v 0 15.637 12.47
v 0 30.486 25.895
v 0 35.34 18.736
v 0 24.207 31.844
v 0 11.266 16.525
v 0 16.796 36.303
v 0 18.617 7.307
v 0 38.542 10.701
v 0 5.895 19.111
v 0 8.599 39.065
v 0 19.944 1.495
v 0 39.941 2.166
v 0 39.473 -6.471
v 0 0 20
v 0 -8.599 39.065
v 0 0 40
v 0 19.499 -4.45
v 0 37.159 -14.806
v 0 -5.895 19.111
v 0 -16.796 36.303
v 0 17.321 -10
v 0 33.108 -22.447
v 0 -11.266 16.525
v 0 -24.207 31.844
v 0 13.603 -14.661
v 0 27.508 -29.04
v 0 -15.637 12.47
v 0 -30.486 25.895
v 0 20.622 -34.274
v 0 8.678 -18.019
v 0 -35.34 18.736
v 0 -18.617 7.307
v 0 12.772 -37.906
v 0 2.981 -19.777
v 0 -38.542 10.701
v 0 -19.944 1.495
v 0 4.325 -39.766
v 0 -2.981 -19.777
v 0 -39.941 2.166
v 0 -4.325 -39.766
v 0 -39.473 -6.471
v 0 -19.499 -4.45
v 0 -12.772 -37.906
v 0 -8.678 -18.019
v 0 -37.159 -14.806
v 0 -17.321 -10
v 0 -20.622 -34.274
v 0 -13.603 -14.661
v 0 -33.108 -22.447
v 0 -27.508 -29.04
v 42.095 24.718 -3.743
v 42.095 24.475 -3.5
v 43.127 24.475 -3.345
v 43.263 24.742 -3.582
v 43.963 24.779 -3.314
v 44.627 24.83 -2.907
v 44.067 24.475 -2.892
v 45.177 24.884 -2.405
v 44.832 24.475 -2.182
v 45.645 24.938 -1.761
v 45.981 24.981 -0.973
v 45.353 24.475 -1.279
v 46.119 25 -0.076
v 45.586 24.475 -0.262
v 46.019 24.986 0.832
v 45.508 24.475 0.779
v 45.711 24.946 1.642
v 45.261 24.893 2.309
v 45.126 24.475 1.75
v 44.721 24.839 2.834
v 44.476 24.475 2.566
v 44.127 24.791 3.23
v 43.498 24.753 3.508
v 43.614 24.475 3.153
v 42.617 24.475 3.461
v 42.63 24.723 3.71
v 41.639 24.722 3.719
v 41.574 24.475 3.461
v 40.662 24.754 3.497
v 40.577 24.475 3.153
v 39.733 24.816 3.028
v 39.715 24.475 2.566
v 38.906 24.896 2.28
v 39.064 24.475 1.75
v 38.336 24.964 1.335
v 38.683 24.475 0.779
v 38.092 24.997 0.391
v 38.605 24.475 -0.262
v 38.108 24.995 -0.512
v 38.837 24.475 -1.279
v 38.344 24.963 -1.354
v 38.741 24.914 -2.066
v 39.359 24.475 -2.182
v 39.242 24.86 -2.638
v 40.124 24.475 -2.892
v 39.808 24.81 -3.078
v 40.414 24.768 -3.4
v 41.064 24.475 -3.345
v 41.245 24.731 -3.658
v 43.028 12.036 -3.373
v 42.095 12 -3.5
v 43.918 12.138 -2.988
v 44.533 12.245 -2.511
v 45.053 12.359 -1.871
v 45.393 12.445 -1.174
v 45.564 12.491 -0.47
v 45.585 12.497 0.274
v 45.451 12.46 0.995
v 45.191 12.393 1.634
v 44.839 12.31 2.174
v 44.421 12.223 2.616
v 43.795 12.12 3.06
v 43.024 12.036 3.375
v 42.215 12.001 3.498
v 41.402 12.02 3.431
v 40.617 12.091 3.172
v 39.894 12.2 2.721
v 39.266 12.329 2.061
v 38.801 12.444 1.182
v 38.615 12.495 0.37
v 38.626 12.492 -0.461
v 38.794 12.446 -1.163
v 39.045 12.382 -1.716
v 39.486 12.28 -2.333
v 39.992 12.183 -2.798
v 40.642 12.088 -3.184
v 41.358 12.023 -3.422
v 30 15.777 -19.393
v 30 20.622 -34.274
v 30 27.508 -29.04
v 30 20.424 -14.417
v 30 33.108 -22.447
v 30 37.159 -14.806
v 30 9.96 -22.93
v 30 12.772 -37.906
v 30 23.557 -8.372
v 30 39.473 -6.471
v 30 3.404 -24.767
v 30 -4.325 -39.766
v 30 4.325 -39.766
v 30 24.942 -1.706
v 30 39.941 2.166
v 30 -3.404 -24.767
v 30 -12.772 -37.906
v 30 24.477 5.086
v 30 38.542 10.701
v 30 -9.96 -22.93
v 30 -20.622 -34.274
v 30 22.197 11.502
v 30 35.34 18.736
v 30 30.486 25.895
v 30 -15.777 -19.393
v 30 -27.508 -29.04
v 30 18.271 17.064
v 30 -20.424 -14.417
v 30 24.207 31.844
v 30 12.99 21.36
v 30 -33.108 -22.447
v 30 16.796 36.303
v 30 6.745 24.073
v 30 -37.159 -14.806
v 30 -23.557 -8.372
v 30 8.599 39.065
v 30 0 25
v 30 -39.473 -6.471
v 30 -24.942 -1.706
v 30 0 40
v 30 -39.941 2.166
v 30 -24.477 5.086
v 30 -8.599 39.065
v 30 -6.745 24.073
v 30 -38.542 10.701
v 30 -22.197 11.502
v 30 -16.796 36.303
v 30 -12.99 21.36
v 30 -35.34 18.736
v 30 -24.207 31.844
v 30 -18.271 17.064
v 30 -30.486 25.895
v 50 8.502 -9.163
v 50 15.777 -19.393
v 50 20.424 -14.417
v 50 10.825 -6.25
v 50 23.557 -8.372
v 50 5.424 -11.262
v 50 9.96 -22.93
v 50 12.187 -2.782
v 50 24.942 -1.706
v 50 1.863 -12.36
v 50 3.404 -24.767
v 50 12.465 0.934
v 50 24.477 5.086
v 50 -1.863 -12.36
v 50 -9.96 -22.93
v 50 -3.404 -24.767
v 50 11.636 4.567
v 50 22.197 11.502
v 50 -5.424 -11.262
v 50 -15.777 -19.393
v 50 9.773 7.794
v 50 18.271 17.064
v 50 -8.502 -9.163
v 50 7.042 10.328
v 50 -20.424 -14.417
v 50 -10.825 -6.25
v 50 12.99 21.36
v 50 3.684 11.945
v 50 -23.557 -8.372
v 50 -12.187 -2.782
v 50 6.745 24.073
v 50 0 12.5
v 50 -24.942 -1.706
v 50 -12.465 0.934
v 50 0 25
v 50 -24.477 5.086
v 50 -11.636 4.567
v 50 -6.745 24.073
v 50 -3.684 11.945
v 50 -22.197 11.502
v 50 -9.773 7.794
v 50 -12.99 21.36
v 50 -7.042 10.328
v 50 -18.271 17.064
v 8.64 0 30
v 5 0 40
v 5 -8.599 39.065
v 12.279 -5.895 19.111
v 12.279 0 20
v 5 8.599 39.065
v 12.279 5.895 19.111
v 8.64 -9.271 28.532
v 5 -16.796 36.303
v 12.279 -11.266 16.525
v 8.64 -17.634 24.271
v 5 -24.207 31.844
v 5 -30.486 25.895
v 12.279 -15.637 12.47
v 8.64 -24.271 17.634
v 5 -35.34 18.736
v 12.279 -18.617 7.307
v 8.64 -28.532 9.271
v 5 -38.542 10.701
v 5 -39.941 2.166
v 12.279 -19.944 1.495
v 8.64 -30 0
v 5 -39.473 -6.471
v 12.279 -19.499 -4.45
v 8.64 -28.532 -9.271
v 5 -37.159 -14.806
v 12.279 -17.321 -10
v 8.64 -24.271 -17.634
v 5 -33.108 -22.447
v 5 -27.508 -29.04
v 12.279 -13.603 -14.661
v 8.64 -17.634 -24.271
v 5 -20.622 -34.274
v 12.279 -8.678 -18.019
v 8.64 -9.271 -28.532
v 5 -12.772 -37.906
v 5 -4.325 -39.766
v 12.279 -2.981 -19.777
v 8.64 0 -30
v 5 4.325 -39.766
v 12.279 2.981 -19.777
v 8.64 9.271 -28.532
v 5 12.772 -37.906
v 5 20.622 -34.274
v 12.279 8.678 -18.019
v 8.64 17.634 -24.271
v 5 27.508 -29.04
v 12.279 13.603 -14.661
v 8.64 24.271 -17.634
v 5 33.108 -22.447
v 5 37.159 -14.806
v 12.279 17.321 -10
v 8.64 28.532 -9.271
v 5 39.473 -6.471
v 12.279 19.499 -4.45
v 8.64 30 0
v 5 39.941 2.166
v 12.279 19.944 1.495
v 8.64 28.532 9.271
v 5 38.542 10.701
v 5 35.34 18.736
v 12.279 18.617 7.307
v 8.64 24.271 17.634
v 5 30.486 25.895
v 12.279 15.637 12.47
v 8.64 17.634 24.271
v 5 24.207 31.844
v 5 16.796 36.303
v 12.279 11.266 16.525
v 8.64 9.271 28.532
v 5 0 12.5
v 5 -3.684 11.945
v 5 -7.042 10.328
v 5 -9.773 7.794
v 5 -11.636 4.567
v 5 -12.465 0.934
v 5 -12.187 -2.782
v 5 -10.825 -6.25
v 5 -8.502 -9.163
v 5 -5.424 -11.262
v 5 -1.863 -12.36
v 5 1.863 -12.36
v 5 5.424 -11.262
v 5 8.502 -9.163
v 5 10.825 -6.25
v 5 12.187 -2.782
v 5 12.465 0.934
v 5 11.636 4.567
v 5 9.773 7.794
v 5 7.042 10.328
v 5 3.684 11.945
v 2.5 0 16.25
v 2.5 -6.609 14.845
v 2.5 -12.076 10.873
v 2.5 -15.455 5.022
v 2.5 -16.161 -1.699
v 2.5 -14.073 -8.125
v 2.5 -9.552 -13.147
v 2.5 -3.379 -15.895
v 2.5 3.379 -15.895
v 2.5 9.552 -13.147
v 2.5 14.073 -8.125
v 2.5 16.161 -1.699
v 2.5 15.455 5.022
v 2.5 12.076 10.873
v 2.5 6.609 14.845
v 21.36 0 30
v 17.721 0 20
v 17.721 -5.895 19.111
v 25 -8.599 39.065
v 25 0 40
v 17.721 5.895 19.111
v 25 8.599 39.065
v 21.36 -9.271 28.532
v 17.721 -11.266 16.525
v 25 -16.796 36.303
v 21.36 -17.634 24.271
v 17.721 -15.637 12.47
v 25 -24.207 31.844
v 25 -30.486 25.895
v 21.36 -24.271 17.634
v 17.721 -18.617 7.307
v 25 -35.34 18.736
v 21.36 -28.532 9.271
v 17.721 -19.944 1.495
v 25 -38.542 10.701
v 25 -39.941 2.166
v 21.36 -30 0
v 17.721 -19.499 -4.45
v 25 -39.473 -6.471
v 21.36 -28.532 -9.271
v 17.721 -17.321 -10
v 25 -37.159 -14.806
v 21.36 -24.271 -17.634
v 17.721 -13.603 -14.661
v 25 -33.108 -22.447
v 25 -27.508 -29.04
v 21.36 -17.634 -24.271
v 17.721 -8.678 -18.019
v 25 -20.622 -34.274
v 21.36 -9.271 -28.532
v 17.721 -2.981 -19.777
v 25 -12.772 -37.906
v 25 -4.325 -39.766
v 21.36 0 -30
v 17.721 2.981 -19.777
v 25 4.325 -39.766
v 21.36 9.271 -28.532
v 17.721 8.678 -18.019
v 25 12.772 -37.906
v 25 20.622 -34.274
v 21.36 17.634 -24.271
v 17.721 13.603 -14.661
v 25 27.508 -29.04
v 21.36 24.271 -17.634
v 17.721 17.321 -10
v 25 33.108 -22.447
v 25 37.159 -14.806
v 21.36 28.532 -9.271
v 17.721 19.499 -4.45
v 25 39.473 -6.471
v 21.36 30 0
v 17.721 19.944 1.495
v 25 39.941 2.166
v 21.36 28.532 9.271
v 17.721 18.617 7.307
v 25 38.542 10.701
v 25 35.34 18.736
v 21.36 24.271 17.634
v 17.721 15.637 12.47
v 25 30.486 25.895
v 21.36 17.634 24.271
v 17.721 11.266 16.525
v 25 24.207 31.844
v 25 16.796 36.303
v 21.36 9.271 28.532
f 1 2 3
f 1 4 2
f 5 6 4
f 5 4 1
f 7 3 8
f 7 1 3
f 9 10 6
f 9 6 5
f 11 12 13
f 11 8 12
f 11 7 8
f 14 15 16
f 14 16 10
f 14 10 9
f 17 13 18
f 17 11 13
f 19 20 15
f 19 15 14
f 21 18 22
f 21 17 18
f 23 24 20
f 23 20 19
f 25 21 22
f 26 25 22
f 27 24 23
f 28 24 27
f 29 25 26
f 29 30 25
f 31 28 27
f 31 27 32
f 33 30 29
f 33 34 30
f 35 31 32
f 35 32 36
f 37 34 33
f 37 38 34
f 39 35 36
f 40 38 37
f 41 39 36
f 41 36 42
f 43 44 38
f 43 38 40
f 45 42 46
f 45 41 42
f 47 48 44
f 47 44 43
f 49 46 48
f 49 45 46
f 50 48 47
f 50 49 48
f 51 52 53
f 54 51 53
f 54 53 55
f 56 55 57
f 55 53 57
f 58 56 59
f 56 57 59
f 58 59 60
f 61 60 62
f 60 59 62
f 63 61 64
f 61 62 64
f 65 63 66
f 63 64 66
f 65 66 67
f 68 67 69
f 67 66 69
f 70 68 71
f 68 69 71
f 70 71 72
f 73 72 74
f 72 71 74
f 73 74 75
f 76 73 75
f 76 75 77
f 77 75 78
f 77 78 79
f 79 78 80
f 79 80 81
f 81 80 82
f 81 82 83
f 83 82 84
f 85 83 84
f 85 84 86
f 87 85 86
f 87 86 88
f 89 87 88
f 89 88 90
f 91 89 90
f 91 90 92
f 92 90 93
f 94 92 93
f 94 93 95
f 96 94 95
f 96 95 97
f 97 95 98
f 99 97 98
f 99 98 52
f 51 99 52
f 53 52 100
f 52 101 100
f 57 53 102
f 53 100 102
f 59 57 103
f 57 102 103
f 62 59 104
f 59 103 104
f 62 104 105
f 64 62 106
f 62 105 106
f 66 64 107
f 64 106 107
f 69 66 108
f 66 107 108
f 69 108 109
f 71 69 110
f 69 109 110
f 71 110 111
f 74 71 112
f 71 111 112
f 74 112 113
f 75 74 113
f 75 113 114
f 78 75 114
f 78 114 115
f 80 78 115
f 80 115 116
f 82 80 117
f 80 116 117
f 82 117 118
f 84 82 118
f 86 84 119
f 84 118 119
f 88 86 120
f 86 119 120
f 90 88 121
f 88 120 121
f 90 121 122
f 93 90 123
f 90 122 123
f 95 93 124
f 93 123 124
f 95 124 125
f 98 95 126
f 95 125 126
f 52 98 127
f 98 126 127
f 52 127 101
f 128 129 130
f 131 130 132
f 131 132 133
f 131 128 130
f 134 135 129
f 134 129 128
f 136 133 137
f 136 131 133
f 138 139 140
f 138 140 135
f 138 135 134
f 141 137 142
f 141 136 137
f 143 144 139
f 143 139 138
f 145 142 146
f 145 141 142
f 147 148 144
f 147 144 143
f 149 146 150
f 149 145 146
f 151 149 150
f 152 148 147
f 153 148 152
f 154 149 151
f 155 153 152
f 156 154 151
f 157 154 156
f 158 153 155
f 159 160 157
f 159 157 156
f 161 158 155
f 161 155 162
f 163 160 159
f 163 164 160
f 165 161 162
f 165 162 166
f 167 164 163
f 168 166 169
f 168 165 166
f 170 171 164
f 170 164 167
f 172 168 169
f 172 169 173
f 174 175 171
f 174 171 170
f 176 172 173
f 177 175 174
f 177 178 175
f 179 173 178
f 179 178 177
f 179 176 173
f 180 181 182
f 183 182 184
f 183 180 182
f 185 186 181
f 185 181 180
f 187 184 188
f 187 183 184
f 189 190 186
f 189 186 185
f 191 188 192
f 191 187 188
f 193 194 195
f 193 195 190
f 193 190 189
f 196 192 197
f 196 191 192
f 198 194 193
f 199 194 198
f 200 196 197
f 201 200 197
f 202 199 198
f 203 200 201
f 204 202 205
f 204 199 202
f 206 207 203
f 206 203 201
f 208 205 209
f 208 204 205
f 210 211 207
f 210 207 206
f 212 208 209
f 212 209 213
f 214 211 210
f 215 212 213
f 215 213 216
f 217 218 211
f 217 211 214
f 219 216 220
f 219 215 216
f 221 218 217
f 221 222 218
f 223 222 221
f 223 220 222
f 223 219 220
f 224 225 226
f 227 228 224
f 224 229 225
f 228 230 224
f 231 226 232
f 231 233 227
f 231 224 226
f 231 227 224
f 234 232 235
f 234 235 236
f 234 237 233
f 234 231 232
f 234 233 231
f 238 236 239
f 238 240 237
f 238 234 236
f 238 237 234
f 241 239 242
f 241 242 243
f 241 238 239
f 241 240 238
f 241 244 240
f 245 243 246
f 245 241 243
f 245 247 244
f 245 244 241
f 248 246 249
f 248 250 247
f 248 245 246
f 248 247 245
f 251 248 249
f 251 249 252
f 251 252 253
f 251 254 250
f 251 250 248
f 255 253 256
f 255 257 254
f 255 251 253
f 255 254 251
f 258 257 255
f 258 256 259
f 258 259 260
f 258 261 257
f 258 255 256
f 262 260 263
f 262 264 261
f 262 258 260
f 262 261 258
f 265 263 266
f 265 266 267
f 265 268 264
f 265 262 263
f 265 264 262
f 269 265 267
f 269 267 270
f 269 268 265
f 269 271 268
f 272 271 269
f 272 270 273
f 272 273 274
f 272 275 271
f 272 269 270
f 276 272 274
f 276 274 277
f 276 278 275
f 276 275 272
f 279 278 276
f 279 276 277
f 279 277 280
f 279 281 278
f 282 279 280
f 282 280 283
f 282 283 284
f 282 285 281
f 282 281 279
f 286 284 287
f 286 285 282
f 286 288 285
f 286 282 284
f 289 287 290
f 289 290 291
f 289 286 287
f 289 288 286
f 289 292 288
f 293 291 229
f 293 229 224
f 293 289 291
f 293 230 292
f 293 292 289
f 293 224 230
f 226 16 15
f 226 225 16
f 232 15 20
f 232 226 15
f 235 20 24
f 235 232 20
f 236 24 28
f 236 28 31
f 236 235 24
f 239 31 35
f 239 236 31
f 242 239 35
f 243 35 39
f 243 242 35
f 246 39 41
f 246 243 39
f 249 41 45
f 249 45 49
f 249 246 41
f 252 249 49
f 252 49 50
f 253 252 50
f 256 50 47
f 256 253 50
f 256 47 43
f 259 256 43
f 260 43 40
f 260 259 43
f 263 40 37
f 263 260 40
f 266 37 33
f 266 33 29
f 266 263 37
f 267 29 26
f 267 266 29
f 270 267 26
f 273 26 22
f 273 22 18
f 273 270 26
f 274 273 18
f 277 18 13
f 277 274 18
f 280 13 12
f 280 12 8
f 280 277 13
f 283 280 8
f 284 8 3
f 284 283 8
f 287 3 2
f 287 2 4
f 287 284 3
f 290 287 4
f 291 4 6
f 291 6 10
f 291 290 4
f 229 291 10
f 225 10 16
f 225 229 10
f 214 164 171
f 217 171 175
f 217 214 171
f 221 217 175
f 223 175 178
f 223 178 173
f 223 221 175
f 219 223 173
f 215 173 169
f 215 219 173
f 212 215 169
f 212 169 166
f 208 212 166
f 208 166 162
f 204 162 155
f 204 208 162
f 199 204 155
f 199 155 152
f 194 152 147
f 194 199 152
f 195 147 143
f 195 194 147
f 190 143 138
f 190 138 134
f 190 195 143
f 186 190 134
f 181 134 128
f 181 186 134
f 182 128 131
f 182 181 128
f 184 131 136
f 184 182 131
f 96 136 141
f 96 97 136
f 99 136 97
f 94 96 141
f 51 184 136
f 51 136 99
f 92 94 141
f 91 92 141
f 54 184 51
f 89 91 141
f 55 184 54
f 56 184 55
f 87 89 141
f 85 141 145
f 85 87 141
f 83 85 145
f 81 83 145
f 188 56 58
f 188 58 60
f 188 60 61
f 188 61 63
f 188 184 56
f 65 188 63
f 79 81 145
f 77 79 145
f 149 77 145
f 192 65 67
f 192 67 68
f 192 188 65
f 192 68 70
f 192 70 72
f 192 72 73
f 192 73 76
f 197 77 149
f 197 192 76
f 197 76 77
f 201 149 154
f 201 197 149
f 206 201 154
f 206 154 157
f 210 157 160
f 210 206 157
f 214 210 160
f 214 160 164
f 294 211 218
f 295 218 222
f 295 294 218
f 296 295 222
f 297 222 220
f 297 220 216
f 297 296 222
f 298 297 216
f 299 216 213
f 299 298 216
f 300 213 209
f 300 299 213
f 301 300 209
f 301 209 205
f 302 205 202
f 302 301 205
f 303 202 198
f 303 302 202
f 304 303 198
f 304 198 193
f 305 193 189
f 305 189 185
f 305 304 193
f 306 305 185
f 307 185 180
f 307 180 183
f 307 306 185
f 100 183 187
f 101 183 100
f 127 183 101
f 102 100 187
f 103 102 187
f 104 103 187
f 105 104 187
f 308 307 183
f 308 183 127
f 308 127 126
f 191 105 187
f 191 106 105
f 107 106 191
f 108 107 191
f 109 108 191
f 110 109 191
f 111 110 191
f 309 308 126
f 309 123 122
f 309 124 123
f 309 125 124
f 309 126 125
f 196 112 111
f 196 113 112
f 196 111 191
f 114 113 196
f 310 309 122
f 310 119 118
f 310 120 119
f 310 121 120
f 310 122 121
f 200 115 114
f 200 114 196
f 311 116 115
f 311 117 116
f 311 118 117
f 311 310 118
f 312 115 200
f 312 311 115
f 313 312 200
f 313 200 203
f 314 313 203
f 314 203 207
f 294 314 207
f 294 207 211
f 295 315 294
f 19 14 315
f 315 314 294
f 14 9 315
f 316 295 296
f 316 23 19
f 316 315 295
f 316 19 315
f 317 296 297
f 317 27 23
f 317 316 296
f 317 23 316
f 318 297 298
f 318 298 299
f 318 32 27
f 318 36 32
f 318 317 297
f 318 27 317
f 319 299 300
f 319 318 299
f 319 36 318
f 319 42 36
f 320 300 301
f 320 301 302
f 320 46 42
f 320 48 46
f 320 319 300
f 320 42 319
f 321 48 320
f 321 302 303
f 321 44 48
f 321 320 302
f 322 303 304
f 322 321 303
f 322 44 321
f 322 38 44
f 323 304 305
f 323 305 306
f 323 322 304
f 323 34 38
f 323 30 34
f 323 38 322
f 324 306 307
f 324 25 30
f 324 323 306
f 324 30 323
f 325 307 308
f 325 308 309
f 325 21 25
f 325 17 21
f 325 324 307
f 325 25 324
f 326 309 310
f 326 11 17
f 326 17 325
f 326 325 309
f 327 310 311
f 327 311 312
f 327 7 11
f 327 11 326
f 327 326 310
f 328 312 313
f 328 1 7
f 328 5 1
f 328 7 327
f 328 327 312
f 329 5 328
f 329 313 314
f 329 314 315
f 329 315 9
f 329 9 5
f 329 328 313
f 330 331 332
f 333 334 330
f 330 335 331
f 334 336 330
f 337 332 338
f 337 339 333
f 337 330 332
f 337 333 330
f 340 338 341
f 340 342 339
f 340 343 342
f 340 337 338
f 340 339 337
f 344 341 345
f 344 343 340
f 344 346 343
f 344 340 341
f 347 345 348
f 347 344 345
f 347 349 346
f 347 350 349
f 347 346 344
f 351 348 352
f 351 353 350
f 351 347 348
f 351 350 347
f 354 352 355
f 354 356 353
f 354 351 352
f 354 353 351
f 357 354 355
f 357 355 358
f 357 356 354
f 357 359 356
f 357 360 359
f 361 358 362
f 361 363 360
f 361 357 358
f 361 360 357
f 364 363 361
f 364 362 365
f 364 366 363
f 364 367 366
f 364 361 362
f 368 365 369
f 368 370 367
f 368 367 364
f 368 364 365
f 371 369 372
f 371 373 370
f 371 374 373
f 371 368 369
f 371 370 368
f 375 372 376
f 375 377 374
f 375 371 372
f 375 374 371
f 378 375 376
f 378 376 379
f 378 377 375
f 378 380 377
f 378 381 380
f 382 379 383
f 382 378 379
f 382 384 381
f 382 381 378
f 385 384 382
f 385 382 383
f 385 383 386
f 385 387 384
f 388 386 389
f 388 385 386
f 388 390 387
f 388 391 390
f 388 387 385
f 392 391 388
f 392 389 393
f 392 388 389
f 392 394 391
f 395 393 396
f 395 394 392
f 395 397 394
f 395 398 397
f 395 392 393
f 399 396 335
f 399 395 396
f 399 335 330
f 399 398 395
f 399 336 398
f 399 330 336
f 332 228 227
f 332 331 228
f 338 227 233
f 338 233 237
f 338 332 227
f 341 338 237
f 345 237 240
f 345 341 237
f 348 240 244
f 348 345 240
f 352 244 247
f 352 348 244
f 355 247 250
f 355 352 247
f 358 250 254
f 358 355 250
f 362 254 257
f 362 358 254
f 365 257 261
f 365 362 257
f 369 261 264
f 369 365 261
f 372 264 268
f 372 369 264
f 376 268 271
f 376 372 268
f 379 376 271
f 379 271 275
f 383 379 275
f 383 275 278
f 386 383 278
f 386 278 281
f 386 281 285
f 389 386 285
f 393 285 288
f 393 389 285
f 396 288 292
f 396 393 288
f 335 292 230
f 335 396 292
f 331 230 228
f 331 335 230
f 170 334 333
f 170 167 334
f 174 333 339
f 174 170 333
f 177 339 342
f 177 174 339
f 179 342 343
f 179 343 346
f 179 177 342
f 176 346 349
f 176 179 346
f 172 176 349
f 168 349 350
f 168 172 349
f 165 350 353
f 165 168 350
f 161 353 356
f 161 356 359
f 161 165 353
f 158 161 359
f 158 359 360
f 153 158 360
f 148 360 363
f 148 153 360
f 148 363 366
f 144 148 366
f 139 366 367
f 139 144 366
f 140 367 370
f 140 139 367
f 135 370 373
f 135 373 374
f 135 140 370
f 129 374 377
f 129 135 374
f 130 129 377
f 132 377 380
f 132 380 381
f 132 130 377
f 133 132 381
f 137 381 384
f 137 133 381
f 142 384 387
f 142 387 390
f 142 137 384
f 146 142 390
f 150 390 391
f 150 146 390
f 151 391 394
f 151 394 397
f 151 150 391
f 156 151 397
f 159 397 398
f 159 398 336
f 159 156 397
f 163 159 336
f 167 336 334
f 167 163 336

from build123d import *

# Parameters (mm, degrees)
M8X1_0_TAPPED_HOLE2_D           = 7
M8X1_0_TAPPED_HOLE2_DEPTH       = 19
M8X1_0_TAPPED_HOLE2_CSINK_D     = 8.05
M8X1_0_TAPPED_HOLE2_CSINK_ANGLE = 90
M8X1_0_TAPPED_HOLE2_TIP         = 2.103012167


with BuildPart() as part:
    # Sketch1 → Revolve2 (revolve)
    with BuildSketch(Plane.XY, mode=Mode.PRIVATE) as revolve2_sk:
        Polygon((5, 12.5), (0, 20), (0, 40), (5, 40), (12.279404685, 20), (17.720595315, 20), (25, 40), (30, 40), (30, 25), (50, 25), (50, 12.5), align=None)
    revolve(revolve2_sk.sketch.rotate(Axis((0, 0, 0), (1, 0, 0)), 90), axis=Axis((0, 0, 0), (1, 0, 0)))

    # M8x1.0 Tapped Hole2
    with Locations(Plane(origin=(42.095304981, 25, 0), x_dir=(0, 0, 1), z_dir=(0, 1, 0))):
        with Locations((0, 0)):
            CounterSinkHole(M8X1_0_TAPPED_HOLE2_D / 2, M8X1_0_TAPPED_HOLE2_CSINK_D / 2, depth=M8X1_0_TAPPED_HOLE2_DEPTH, counter_sink_angle=M8X1_0_TAPPED_HOLE2_CSINK_ANGLE)
            with Locations((0, 0, -(M8X1_0_TAPPED_HOLE2_DEPTH + M8X1_0_TAPPED_HOLE2_TIP / 2))):  # 118° drill point
                Cone(0, M8X1_0_TAPPED_HOLE2_D / 2, M8X1_0_TAPPED_HOLE2_TIP, mode=Mode.SUBTRACT)


solid = part.part
